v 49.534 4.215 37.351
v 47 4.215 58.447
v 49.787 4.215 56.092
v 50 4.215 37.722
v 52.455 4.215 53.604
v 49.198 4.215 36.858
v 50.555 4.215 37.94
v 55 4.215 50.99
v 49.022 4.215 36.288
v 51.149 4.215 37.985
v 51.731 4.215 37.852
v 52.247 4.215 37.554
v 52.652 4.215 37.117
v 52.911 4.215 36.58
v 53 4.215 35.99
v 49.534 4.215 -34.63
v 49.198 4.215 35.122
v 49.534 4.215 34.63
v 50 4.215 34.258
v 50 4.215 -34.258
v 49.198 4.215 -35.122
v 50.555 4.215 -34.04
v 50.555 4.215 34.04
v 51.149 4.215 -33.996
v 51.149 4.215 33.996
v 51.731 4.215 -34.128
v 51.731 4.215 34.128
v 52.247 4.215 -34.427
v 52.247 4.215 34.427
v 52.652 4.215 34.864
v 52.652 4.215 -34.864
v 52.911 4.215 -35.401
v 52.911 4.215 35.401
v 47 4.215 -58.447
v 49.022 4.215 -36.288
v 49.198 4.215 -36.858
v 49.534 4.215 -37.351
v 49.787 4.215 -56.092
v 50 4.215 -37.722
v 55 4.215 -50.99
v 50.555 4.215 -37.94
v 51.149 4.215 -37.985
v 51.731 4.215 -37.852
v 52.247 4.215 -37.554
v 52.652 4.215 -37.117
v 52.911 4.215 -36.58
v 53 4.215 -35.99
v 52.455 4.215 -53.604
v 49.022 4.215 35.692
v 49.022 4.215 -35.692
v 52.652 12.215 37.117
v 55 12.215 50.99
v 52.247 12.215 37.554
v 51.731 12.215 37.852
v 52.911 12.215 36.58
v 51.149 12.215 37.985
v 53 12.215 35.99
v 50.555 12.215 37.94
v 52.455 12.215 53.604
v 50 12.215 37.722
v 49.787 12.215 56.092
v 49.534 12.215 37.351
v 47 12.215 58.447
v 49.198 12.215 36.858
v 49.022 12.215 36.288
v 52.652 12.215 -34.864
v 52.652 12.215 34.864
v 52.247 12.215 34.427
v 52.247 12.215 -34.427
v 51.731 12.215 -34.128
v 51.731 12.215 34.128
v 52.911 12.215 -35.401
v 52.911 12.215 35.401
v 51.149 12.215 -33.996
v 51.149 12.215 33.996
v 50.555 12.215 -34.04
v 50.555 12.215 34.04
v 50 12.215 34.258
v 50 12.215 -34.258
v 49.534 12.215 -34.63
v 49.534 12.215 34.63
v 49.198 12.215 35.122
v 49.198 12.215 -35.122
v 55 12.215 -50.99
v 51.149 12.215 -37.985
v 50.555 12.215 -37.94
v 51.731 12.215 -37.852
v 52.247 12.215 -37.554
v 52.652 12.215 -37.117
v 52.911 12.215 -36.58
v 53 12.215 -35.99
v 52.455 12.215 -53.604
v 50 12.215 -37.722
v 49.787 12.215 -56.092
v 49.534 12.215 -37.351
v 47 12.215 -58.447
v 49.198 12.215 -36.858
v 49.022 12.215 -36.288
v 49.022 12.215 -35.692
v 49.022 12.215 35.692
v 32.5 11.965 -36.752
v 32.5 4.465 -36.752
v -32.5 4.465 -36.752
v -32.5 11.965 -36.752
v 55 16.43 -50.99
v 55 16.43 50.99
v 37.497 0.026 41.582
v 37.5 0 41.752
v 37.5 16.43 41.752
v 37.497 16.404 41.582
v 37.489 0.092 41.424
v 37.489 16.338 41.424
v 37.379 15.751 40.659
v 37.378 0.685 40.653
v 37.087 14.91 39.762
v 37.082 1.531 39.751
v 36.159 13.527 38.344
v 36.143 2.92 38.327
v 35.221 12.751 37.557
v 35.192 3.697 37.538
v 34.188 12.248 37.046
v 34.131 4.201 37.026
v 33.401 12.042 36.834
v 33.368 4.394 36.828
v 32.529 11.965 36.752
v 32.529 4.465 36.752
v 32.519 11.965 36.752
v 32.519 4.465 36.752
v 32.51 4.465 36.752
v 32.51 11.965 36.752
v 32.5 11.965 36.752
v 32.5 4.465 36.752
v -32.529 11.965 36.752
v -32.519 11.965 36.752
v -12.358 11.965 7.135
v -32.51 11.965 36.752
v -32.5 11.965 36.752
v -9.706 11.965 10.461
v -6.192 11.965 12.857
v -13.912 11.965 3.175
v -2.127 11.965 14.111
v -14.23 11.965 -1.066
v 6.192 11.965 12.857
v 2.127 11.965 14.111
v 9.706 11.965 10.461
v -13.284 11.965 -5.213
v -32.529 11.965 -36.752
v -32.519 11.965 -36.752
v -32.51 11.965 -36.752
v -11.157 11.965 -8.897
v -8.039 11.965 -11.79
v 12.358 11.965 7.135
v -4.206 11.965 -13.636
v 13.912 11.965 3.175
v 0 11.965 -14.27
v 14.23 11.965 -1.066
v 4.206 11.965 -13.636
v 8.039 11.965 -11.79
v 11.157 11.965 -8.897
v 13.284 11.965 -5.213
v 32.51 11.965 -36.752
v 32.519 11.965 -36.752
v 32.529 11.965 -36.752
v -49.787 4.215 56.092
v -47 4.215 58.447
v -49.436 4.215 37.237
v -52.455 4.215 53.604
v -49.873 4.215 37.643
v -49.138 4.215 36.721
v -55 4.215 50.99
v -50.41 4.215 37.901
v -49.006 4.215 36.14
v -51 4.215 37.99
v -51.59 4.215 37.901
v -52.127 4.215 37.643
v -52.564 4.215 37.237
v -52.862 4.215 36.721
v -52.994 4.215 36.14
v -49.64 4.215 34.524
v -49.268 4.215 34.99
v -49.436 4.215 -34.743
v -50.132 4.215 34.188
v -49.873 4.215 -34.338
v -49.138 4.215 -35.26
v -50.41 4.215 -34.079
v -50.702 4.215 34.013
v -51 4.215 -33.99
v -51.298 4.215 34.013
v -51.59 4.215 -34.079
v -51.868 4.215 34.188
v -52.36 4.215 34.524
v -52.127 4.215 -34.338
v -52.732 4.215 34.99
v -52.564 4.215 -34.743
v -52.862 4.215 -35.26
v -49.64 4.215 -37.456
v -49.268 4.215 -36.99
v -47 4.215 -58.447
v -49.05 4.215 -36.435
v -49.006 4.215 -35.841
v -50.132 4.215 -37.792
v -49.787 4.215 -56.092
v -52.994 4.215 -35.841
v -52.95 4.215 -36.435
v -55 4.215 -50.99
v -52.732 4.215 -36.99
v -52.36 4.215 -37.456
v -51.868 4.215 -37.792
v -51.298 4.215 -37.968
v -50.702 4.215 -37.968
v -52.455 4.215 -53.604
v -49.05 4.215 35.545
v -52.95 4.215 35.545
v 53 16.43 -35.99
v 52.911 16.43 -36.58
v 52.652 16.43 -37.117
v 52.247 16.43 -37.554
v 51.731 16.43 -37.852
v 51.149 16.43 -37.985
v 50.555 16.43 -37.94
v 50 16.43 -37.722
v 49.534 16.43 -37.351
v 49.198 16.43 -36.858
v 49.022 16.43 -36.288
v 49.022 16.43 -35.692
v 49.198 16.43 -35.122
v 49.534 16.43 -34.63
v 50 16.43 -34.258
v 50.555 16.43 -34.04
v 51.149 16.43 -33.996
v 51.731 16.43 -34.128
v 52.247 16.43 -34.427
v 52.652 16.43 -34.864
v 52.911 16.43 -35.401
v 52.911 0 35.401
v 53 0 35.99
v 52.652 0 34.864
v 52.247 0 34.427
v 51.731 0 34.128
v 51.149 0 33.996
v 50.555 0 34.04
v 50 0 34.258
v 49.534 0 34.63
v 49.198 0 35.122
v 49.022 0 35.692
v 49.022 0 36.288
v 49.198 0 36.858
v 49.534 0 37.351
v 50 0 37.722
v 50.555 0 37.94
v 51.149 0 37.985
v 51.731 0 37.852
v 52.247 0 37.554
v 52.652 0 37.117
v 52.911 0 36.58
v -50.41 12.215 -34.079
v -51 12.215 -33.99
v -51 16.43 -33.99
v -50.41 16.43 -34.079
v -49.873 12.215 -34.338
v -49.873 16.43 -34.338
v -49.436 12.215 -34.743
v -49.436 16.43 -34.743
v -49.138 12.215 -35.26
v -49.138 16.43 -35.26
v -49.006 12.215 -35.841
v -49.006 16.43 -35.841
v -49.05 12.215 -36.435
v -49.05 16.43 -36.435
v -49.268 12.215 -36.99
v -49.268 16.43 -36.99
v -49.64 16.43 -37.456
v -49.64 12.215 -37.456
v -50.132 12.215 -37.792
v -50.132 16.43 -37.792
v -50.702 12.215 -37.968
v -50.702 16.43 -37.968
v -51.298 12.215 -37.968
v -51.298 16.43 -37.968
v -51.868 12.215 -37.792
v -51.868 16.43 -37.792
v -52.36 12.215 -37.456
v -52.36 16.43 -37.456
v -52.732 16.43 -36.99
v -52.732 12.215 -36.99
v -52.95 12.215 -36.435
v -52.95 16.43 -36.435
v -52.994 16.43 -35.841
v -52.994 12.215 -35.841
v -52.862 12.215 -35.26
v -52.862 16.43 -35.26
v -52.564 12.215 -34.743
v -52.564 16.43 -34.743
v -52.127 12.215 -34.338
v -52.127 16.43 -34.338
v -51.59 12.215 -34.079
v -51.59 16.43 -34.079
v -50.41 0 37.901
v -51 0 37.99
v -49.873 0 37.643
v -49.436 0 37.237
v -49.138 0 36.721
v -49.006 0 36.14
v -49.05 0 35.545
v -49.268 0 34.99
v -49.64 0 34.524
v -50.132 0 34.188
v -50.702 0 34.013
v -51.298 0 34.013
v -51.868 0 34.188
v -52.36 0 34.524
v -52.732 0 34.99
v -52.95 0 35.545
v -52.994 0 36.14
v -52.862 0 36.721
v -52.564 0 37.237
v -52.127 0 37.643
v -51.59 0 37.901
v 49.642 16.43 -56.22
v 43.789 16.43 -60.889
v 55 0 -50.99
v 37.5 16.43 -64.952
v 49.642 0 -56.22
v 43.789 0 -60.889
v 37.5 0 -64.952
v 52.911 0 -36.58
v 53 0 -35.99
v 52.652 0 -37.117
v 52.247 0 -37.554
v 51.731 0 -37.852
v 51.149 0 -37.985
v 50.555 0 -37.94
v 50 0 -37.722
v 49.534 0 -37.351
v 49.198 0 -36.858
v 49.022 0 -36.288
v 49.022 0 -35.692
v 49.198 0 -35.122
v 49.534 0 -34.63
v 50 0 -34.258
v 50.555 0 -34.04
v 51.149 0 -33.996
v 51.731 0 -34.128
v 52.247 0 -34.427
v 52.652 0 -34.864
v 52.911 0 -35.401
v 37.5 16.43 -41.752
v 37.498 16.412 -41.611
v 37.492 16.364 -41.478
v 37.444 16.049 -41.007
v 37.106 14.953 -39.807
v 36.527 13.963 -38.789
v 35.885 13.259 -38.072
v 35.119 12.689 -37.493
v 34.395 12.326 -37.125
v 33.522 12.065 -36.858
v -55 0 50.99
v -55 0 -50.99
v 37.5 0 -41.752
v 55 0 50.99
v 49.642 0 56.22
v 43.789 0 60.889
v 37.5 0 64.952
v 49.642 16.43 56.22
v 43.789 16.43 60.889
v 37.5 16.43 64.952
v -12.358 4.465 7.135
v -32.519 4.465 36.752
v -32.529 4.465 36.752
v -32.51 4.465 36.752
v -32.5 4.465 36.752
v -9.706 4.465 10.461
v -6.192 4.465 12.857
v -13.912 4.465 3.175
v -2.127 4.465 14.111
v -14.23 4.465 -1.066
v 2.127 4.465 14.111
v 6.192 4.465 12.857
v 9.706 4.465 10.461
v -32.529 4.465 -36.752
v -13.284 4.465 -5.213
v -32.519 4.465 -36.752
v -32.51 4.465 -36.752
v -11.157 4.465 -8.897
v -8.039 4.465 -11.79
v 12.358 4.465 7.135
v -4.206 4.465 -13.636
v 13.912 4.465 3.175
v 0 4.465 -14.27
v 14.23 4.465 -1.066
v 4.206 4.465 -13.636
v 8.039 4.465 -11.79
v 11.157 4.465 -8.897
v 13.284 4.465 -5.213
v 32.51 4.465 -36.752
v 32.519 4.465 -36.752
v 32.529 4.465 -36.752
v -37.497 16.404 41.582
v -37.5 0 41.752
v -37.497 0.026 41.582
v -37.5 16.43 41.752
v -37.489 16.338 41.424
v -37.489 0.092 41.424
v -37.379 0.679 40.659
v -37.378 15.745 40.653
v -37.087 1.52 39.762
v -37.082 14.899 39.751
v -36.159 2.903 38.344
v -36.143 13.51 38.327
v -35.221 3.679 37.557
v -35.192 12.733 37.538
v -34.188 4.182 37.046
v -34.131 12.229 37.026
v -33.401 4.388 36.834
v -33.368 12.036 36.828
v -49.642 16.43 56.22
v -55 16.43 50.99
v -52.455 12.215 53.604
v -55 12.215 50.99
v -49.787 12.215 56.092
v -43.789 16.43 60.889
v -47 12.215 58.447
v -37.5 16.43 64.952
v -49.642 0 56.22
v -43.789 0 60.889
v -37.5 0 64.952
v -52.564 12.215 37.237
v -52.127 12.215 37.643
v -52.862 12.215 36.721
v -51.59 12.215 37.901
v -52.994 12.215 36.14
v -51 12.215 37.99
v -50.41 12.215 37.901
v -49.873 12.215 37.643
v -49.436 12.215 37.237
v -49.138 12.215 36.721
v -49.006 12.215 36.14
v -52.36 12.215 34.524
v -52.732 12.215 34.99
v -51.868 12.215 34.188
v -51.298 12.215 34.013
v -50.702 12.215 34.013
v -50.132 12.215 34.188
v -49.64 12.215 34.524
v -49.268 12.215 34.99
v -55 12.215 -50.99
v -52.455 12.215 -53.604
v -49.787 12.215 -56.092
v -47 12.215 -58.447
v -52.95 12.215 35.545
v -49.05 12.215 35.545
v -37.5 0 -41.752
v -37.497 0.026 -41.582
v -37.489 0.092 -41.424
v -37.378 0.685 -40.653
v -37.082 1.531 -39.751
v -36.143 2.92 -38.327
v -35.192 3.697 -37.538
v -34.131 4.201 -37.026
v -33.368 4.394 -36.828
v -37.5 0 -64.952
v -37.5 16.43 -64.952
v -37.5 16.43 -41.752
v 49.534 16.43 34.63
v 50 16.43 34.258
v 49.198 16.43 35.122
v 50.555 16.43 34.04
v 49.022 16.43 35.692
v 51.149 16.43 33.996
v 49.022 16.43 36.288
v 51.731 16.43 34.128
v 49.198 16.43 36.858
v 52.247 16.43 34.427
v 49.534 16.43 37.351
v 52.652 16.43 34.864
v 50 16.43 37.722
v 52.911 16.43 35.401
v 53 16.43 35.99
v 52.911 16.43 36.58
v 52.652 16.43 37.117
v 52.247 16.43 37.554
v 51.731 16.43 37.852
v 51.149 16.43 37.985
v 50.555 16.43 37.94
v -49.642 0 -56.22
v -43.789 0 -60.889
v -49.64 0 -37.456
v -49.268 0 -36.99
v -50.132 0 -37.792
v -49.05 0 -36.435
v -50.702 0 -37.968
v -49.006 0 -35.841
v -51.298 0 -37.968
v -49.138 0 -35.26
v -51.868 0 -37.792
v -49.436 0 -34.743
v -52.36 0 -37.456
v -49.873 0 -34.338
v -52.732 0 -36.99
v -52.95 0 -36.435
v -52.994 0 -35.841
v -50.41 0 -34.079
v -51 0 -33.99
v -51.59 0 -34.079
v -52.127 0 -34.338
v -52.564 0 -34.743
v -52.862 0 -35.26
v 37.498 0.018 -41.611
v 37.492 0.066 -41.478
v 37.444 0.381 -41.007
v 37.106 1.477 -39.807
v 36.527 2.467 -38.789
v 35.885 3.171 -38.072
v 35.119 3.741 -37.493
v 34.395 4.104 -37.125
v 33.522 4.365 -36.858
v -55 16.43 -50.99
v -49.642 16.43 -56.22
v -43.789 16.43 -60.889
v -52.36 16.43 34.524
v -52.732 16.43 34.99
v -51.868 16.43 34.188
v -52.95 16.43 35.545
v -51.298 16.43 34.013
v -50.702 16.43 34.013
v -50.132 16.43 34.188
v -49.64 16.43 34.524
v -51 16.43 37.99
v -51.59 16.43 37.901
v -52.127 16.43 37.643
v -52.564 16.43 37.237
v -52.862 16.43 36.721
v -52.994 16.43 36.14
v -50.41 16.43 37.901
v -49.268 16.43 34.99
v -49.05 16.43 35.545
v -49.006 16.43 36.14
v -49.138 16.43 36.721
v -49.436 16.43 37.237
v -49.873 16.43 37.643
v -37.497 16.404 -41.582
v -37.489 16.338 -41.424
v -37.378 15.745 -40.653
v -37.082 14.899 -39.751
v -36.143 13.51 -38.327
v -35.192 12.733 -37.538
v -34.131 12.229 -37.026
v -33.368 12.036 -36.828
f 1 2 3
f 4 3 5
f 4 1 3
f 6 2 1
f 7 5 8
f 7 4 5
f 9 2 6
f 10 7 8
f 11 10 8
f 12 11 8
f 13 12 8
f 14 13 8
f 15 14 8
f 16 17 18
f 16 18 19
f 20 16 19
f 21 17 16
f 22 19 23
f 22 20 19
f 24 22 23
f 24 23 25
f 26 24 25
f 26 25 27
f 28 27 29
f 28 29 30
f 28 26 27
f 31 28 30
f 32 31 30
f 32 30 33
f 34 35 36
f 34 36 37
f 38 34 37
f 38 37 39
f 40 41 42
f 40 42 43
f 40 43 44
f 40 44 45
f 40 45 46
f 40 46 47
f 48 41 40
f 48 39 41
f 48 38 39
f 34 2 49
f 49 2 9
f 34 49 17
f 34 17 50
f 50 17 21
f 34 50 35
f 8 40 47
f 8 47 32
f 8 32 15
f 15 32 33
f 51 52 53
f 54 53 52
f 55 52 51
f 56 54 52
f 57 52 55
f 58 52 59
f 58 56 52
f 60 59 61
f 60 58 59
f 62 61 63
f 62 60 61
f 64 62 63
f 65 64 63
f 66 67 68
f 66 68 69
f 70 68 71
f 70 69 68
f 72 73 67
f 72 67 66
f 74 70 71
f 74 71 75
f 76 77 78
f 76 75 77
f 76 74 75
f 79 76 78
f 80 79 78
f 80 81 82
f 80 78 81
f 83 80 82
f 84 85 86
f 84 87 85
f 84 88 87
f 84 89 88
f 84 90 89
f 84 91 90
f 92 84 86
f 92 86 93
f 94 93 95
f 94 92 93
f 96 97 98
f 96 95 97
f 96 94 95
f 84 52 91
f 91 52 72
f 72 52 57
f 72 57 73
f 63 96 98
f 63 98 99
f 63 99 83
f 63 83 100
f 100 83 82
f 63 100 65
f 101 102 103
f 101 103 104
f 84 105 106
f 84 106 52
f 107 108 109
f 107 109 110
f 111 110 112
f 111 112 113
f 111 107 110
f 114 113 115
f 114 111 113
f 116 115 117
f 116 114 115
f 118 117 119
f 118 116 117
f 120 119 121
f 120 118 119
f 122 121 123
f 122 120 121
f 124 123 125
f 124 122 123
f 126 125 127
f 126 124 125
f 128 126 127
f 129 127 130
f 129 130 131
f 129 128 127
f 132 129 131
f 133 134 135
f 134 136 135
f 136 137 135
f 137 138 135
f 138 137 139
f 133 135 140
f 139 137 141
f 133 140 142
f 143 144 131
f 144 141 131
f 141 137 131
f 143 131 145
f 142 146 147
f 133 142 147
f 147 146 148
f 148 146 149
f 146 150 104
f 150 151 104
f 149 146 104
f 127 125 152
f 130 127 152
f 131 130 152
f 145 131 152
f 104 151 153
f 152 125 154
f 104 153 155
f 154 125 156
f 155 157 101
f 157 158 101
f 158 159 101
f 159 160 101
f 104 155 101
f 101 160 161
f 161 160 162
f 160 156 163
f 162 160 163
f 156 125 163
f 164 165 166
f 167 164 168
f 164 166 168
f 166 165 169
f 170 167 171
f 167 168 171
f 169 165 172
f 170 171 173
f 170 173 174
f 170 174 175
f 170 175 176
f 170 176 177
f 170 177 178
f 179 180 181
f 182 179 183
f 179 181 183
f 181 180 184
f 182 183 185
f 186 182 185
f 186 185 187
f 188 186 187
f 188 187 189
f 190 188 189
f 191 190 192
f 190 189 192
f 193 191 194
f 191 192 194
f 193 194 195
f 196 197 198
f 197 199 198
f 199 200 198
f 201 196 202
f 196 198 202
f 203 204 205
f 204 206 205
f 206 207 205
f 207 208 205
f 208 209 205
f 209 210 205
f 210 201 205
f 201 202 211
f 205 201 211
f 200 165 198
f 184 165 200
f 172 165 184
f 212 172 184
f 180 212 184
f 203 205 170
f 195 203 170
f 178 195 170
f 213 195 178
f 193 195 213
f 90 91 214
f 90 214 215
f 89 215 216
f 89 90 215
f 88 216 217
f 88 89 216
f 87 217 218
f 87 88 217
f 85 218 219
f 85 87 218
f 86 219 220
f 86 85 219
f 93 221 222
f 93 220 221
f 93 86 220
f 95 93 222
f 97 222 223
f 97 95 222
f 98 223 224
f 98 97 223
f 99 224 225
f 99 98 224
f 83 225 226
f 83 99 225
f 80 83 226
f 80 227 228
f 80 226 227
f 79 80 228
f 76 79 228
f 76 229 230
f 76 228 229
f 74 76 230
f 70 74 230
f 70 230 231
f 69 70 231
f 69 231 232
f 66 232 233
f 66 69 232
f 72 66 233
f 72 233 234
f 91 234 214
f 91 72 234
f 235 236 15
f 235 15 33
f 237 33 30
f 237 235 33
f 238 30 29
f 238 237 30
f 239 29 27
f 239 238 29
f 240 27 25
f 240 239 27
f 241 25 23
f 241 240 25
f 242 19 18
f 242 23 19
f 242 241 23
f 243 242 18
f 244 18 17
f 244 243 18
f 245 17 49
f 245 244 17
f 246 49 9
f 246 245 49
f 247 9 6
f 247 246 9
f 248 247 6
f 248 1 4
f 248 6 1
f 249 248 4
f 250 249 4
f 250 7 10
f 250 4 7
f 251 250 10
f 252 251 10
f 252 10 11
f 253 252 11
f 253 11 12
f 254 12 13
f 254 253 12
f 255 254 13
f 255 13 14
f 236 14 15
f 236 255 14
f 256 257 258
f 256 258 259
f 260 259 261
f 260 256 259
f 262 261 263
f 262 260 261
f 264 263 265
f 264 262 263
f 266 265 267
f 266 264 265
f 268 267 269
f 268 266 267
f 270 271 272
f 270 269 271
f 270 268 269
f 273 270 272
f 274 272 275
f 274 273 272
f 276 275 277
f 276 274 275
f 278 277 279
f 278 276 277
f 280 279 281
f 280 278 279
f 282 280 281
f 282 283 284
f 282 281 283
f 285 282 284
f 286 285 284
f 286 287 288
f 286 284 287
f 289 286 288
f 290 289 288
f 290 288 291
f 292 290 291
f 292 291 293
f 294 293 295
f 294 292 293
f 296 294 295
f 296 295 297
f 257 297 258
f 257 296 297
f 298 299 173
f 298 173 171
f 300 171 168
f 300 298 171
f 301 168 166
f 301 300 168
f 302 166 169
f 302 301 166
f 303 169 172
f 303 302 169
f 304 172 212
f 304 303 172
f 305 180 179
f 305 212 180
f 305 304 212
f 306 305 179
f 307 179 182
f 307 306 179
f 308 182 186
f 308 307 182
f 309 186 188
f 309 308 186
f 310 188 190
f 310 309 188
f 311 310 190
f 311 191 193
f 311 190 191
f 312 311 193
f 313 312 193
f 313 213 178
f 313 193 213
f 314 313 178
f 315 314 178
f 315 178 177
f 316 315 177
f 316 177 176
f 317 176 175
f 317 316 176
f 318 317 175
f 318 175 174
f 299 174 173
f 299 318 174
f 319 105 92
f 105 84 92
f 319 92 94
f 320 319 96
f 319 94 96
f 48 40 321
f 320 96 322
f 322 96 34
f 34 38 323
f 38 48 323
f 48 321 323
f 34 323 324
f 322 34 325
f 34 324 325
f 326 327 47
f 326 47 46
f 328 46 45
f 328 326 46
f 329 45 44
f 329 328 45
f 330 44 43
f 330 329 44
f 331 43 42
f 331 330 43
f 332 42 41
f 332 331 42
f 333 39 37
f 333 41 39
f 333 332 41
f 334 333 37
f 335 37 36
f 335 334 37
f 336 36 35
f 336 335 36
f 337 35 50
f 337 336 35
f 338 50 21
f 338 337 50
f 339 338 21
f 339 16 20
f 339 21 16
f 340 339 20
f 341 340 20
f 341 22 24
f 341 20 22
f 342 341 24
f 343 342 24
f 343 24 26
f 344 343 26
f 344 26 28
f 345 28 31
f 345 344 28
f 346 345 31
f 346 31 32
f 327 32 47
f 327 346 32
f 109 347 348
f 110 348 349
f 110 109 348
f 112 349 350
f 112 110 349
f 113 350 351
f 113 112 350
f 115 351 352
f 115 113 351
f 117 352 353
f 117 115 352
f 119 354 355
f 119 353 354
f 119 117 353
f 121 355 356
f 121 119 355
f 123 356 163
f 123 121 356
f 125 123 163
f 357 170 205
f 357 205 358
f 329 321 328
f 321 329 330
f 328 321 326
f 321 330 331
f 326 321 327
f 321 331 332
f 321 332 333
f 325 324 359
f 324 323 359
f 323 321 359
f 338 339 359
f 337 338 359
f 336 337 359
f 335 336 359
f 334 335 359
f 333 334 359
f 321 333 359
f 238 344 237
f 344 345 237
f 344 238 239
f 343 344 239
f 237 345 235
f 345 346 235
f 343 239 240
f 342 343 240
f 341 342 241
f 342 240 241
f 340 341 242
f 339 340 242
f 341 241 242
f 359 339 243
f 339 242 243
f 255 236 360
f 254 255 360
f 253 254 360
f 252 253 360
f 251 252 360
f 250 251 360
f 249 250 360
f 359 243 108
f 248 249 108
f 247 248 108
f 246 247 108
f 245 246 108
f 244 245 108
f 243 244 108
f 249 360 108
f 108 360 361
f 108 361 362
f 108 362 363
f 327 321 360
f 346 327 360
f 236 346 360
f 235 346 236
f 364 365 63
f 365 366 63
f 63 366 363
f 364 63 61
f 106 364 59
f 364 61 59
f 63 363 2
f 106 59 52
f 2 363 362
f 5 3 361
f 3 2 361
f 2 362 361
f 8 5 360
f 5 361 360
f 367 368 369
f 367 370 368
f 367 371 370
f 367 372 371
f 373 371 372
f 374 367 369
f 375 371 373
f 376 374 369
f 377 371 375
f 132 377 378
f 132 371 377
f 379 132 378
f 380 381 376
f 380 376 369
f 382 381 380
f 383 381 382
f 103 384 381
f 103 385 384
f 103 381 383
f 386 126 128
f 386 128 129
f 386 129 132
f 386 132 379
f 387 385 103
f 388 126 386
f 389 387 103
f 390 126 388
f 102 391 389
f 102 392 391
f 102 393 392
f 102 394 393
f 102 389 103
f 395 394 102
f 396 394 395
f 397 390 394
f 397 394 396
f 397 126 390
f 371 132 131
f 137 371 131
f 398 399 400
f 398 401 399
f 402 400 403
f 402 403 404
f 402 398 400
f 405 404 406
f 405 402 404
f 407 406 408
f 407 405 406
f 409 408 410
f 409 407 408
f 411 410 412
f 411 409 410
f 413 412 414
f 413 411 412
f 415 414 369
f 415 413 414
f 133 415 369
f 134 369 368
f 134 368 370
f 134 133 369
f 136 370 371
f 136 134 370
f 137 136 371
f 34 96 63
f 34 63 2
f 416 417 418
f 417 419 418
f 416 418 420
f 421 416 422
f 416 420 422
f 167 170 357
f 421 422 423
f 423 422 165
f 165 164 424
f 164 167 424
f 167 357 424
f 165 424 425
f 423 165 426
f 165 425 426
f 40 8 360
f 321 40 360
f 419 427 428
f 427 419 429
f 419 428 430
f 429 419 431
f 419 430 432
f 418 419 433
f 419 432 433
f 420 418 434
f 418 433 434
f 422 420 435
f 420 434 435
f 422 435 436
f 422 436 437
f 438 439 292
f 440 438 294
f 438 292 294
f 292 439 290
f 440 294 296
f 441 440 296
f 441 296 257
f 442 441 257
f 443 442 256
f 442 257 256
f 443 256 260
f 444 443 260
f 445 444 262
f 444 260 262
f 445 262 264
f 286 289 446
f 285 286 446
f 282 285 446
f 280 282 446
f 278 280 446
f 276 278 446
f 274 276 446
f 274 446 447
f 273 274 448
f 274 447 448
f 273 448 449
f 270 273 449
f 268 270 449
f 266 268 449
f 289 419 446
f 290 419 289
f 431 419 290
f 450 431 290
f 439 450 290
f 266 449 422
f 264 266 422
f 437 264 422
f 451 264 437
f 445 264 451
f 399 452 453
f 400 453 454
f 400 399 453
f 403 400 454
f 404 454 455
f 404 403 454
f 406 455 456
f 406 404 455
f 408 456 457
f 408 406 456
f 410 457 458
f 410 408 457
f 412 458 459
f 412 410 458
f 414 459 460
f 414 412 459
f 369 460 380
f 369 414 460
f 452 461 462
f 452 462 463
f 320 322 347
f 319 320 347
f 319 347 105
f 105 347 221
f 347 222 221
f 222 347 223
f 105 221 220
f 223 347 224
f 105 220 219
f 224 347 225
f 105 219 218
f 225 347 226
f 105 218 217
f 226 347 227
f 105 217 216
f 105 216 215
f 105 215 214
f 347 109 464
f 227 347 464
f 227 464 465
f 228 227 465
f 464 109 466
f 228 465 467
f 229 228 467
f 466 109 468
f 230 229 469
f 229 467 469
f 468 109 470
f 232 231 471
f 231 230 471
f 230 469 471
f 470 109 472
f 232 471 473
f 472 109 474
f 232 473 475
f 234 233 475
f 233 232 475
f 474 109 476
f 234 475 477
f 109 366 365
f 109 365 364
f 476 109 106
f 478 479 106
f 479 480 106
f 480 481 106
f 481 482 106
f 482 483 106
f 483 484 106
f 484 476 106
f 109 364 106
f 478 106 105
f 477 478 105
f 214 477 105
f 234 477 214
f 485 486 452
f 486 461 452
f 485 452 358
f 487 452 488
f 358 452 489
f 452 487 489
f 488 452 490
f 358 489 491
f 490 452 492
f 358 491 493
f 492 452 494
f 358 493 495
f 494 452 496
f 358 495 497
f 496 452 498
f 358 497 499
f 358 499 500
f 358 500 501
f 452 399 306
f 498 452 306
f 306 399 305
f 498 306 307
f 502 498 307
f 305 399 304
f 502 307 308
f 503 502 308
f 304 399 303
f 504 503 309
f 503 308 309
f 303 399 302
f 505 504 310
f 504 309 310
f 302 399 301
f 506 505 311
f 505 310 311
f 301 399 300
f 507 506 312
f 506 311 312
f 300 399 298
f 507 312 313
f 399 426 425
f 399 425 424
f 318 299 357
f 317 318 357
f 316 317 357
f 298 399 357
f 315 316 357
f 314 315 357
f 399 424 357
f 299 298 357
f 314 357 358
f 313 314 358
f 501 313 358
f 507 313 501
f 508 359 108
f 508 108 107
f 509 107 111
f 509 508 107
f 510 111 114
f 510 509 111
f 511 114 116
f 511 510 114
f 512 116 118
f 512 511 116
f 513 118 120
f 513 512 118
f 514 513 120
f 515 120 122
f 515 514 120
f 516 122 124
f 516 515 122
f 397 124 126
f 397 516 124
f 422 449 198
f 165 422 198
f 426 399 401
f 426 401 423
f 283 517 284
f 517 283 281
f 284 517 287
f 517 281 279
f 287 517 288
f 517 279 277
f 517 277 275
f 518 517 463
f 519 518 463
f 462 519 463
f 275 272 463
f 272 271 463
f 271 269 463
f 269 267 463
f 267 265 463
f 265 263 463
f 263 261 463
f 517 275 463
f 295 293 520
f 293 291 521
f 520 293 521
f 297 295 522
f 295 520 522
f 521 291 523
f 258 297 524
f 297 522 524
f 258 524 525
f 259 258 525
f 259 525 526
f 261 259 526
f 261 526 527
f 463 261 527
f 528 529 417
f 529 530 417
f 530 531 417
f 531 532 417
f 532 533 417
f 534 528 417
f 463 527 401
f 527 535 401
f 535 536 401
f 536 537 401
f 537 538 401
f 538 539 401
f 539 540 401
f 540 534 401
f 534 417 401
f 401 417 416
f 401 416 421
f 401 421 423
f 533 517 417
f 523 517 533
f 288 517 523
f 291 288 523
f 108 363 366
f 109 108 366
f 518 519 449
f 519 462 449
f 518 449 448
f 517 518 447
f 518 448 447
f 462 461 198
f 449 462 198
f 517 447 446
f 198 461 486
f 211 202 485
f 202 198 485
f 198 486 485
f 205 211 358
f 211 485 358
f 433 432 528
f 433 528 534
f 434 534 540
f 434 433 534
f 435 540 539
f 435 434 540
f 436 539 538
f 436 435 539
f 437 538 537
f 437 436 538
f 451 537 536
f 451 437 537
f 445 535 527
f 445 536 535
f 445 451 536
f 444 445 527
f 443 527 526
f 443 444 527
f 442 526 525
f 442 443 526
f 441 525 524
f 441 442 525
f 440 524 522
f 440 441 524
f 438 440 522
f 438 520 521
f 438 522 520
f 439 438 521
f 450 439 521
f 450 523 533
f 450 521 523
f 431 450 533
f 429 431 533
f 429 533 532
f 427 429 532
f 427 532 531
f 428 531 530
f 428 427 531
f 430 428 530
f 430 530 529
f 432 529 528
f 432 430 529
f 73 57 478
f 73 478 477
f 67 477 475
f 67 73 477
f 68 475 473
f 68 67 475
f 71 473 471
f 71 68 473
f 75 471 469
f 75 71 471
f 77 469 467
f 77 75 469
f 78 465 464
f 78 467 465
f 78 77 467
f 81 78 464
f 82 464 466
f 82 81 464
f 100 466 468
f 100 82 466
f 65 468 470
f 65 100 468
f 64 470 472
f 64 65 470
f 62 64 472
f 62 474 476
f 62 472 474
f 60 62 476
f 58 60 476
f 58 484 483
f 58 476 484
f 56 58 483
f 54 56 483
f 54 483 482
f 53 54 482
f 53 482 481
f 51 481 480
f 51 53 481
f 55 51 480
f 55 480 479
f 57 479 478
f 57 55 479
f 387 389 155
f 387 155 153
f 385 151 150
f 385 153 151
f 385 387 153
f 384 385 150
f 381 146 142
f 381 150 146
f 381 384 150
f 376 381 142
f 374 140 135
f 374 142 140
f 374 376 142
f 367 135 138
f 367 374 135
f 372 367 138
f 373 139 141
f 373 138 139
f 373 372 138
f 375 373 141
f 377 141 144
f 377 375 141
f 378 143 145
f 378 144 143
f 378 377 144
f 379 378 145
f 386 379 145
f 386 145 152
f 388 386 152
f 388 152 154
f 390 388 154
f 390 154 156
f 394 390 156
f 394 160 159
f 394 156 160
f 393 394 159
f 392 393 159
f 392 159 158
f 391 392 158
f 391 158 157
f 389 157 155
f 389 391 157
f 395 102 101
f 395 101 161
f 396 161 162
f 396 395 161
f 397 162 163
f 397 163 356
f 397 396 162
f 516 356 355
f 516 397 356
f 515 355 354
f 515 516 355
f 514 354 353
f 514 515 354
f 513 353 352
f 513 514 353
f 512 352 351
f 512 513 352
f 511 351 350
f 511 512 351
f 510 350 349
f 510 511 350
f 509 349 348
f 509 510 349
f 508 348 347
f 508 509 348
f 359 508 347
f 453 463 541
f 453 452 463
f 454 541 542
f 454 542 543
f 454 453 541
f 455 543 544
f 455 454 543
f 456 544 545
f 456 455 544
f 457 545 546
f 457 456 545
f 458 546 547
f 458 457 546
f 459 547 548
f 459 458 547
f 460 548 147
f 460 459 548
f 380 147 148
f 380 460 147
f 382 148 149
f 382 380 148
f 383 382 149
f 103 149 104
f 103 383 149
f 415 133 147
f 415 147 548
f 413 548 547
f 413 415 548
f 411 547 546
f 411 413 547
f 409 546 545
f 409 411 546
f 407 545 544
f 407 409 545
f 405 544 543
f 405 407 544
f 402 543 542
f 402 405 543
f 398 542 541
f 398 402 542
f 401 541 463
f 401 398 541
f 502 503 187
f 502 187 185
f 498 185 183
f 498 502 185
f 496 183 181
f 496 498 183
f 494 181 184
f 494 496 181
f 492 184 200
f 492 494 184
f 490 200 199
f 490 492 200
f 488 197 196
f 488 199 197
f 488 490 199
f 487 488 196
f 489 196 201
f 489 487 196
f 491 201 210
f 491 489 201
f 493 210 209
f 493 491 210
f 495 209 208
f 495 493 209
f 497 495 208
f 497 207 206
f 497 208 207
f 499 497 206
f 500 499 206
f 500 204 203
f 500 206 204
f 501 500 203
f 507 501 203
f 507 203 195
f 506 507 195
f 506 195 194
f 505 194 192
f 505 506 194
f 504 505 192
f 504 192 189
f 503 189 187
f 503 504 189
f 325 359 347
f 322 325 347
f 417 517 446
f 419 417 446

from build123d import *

# Parameters (mm, degrees)
SALIENTE_EXTRUIR1_DEPTH    = 100
CORTAR_EXTRUIR1_DEPTH      = 116.30370722574361
CORTAR_EXTRUIR1_DEPTH_BACK = 116.30370722574361
CROQUIS4_OUTSIDE_W         = 157.768
CROQUIS4_OUTSIDE_H         = 247.76800000000003
CROQUIS4_OUTSIDE_R         = 75.00000000000001
CORTAR_EXTRUIR2_DEPTH      = 95.44545992264534
CORTAR_EXTRUIR2_DEPTH_BACK = 95.44545992264534
CORTAR_EXTRUIR3_DEPTH      = 86.94714204090798
CORTAR_EXTRUIR3_DEPTH_BACK = 86.94714204090798
CROQUIS5_R                 = 14.27
REDONDEO1_R                = 5
CORTAR_EXTRUIR4_DEPTH      = 87.68157187826033
CORTAR_EXTRUIR4_DEPTH_BACK = 87.68157187826033
CORTAR_EXTRUIR5_DEPTH      = 86.98230182684696
CORTAR_EXTRUIR5_DEPTH_BACK = 86.98230182684696
CROQUIS8_R                 = 2.0000000000000036


with BuildPart() as part:
    # Croquis3 → Saliente-Extruir1 (new, symmetric)
    with BuildSketch(Plane.XY):
        Polygon((37.50000000000001, 4.465), (0, 4.465), (-37.50000000000001, 4.465), (-37.5, 0), (-54.99999999999999, 0), (-54.99999999999999, 6.5), (-54.99999999999999, 16.43), (-37.5, 16.43), (-37.50000000000001, 11.965), (0, 11.965), (37.50000000000001, 11.965), (37.5, 16.43), (54.99999999999999, 16.43), (54.99999999999999, 0), (37.5, 0), align=None)
    extrude(amount=SALIENTE_EXTRUIR1_DEPTH, both=True)

    # Croquis4 outside → Cortar-Extruir1 (cut, two sides: drawn at the far end of the back side and taken through both)
    with BuildSketch(Plane(origin=(0, 0, 0), x_dir=(1, 0, 0), z_dir=(0, 1, 0)).offset(-CORTAR_EXTRUIR1_DEPTH_BACK)):
        Rectangle(CROQUIS4_OUTSIDE_W, CROQUIS4_OUTSIDE_H)
        Circle(CROQUIS4_OUTSIDE_R, mode=Mode.SUBTRACT)
    extrude(amount=CORTAR_EXTRUIR1_DEPTH + CORTAR_EXTRUIR1_DEPTH_BACK, mode=Mode.SUBTRACT)

    # Croquis4<3> → Cortar-Extruir2 (cut, two sides: drawn at the far end of the back side and taken through both)
    with BuildSketch(Plane(origin=(0, 0, 0), x_dir=(1, 0, 0), z_dir=(0, 1, 0)).offset(-CORTAR_EXTRUIR2_DEPTH_BACK)):
        with BuildLine():
            ThreePointArc((37.500000000000966, 64.95190528383236), (1.17033e-12, 75.00000000000001), (-37.499999999998956, 64.95190528383351))
            Line((-37.50000000000001, 64.95190528383388), (-37.50000000000001, 36.752103032136134))
            Line((-37.50000000000001, 36.752103032136134), (37.50000000000001, 36.752103032136134))
            Line((37.50000000000001, 36.752103032136134), (37.50000000000001, 64.95190528383202))
        make_face()
        with BuildLine():
            Line((-37.50000000000001, -36.752103032136134), (-37.50000000000001, -64.95190528383385))
            ThreePointArc((-37.499999999999, -64.95190528383348), (1.18526e-12, -75.00000000000001), (37.50000000000099, -64.95190528383235))
            Line((37.50000000000001, -64.951905283832), (37.50000000000001, -36.752103032136134))
            Line((37.50000000000001, -36.752103032136134), (-37.50000000000001, -36.752103032136134))
        make_face()
    extrude(amount=CORTAR_EXTRUIR2_DEPTH + CORTAR_EXTRUIR2_DEPTH_BACK, mode=Mode.SUBTRACT)

    # Croquis5 → Cortar-Extruir3 (cut, two sides: drawn at the far end of the back side and taken through both)
    with BuildSketch(Plane(origin=(0, 11.965, 0), x_dir=(1, 0, 0), z_dir=(0, 1, 0)).offset(-CORTAR_EXTRUIR3_DEPTH_BACK)):
        with Locations(Location((0, 0, 0), (0, 0, 90))):
            Circle(CROQUIS5_R)
    extrude(amount=CORTAR_EXTRUIR3_DEPTH + CORTAR_EXTRUIR3_DEPTH_BACK, mode=Mode.SUBTRACT)

    # Redondeo1
    # the kernel refuses this fillet: 5 mm, written as the material it adds along each edge
    with BuildSketch(Plane(origin=(-37.50000000000001, 4.465, 36.752103032136134), x_dir=(1, 0, 0), z_dir=(0, 0, -1))) as redondeo1_piece_1:
        with BuildLine():
            CenterArc((4.971295102888192, 5), REDONDEO1_R, 186.14240739101976, 83.85759260898021)
            Line((1.421e-14, 4.465000000000001), (-0.09942590205774593, 4.454300000000001))
            ThreePointArc((-0.09942590205774593, 4.454300000000001), (-0.09999999999999432, 2.2325000000000004), (-0.10000000000000142, 0))
            Line((-0.10000000000000142, 0), (0, -0.09999999999999964))
            Line((0, -0.09999999999999964), (4.971295102888192, -0.09999999999999964))
            Line((4.971295102888192, -0.09999999999999964), (4.971295102888192, 0))
        make_face()
    extrude(amount=73.50420606427225)
    with BuildSketch(Plane(origin=(-37.50000000000001, 11.965, 36.752103032136134), x_dir=(1, 0, 0), z_dir=(0, 0, -1))) as redondeo1_piece_2:
        with BuildLine():
            CenterArc((4.971295102888185, -5), REDONDEO1_R, 90, 83.85759260898024)
            Line((7.11e-15, -4.465), (-0.09942590205775304, -4.4543))
            ThreePointArc((-0.09942590205775304, -4.4543), (-0.10000000000001563, -2.2325000000000017), (-0.10000000000000142, 0))
            Line((-0.10000000000000142, 0), (0, 0.09999999999999964))
            Line((0, 0.09999999999999964), (4.971295102888185, 0.09999999999999964))
            Line((4.971295102888185, 0.09999999999999964), (4.971295102888185, 0))
        make_face()
    extrude(amount=73.50420606427225)
    with BuildSketch(Plane(origin=(37.50000000000001, 11.965, 36.752103032136134), x_dir=(-3.18e-15, 1, 0), z_dir=(0, 0, -1))) as redondeo1_piece_3:
        with BuildLine():
            CenterArc((5.000000000000016, -4.971295102888176), REDONDEO1_R, 96.14240739101996, 83.85759260898021)
            Line((1.582e-14, -4.971295102888192), (-0.09999999999998382, -4.971295102888192))
            Line((-0.09999999999998382, -4.971295102888192), (-0.09999999999999964, -3.2e-16))
            Line((-0.09999999999999964, -3.2e-16), (-3.2e-16, 0.10000000000000142))
            ThreePointArc((-3.2e-16, 0.10000000000000142), (2.2324999999999995, 0.10000000000002274), (4.4543, 0.09942590205776011))
            Line((4.4543, 0.09942590205776011), (4.465, 0))
        make_face()
    extrude(amount=73.50420606427225)
    with BuildSketch(Plane(origin=(37.50000000000001, 4.465, -36.752103032136134), x_dir=(-1.59e-15, -1, 0), z_dir=(0, 0, 1))) as redondeo1_piece_4:
        with BuildLine():
            CenterArc((5.000000000000008, -4.971295102888177), REDONDEO1_R, 96.14240739101987, 83.85759260898021)
            Line((7.91e-15, -4.971295102888185), (-0.09999999999999173, -4.971295102888185))
            Line((-0.09999999999999173, -4.971295102888185), (-0.09999999999999964, -1.6e-16))
            Line((-0.09999999999999964, -1.6e-16), (-1.6e-16, 0.10000000000000142))
            ThreePointArc((-1.6e-16, 0.10000000000000142), (2.2325, 0.09999999999999787), (4.4543, 0.09942590205776013))
            Line((4.4543, 0.09942590205776013), (4.465, 0))
        make_face()
    extrude(amount=73.50420606427225)
    with BuildSketch(Plane(origin=(37.50000000000001, 4.465000000000003, -36.752103032136134), x_dir=(0, 0, -1), z_dir=(0, 1, 0)), Plane(origin=(-37.50000000000001, 4.465000000000003, -36.752103032136134), x_dir=(1, 0, 0), z_dir=(0, 1, 0)), Plane(origin=(-37.50000000000001, 11.965000000000003, 36.752103032136134), x_dir=(1, 0, 0), z_dir=(0, -1, 0))) as redondeo1_piece_5:
        with BuildLine():
            CenterArc((REDONDEO1_R, REDONDEO1_R), REDONDEO1_R, 180, 90)
            Line((0, REDONDEO1_R), (-REDONDEO1_R * 0.02, REDONDEO1_R))
            Line((-REDONDEO1_R * 0.02, REDONDEO1_R), (-REDONDEO1_R * 0.02, -REDONDEO1_R * 0.02))
            Line((-REDONDEO1_R * 0.02, -REDONDEO1_R * 0.02), (REDONDEO1_R, -REDONDEO1_R * 0.02))
            Line((REDONDEO1_R, -REDONDEO1_R * 0.02), (REDONDEO1_R, 0))
        make_face()
    extrude(amount=7.5)
    with BuildSketch(Plane(origin=(37.50000000000001, 4.465000000000003, 36.752103032136134), x_dir=(0, 0, 1), z_dir=(0, 1, 0))) as redondeo1_piece_6:
        with BuildLine():
            CenterArc((REDONDEO1_R, -REDONDEO1_R), REDONDEO1_R, 90, 90)
            Line((0, -REDONDEO1_R), (-REDONDEO1_R * 0.02, -REDONDEO1_R))
            Line((-REDONDEO1_R * 0.02, -REDONDEO1_R), (-REDONDEO1_R * 0.02, REDONDEO1_R * 0.02))
            Line((-REDONDEO1_R * 0.02, REDONDEO1_R * 0.02), (REDONDEO1_R, REDONDEO1_R * 0.02))
            Line((REDONDEO1_R, REDONDEO1_R * 0.02), (REDONDEO1_R, 0))
        make_face()
    extrude(amount=7.5)
    with BuildSketch(Plane(origin=(-37.50000000000001, 4.465, 49.18034078935661), x_dir=(1, 0, 0), z_dir=(0, 0, -1))) as redondeo1_piece_7a_section:
        with BuildLine():
            CenterArc((4.971295102888192, 5), REDONDEO1_R, 186.14240739101976, 83.85759260898021)
            Line((1.421e-14, 4.465000000000001), (-0.09942590205774593, 4.454300000000001))
            ThreePointArc((-0.09942590205774593, 4.454300000000001), (-0.09999999999999432, 2.2325000000000004), (-0.10000000000000142, 0))
            Line((-0.10000000000000142, 0), (0, -0.09999999999999964))
            Line((0, -0.09999999999999964), (4.971295102888192, -0.09999999999999964))
            Line((4.971295102888192, -0.09999999999999964), (4.971295102888192, 0))
        make_face()
    redondeo1_piece_7a = extrude(amount=85.93244382149274, mode=Mode.PRIVATE)
    redondeo1_piece_7a = split(redondeo1_piece_7a, bisect_by=Plane(origin=(-36.3586151753133, 3.3888910870281705, 36.752103032136134), z_dir=(0, 0, 1)), keep=Keep.TOP, mode=Mode.PRIVATE)
    with BuildSketch(Plane(origin=(-37.50000000000001, 11.965000000000003, 36.752103032136134), x_dir=(1, 0, 0), z_dir=(0, -1, 0))) as redondeo1_piece_7b_section:
        with BuildLine():
            CenterArc((REDONDEO1_R, REDONDEO1_R), REDONDEO1_R, 180, 90)
            Line((0, REDONDEO1_R), (-REDONDEO1_R * 0.02, REDONDEO1_R))
            Line((-REDONDEO1_R * 0.02, REDONDEO1_R), (-REDONDEO1_R * 0.02, -REDONDEO1_R * 0.02))
            Line((-REDONDEO1_R * 0.02, -REDONDEO1_R * 0.02), (REDONDEO1_R, -REDONDEO1_R * 0.02))
            Line((REDONDEO1_R, -REDONDEO1_R * 0.02), (REDONDEO1_R, 0))
        make_face()
    redondeo1_piece_7b = extrude(amount=20, mode=Mode.PRIVATE)
    redondeo1_piece_7b = split(redondeo1_piece_7b, bisect_by=Plane(origin=(-36.3680244286659, 4.465, 37.884078603470265), z_dir=(0, -1, 0)), keep=Keep.TOP, mode=Mode.PRIVATE)
    redondeo1_piece_7b = split(redondeo1_piece_7b, bisect_by=Plane(origin=(-36.368024428665905, 0, 37.884078603470265), z_dir=(0, 1, 0)), keep=Keep.TOP, mode=Mode.PRIVATE)
    redondeo1_piece_7 = redondeo1_piece_7a & redondeo1_piece_7b
    add(redondeo1_piece_7)
    with BuildSketch(Plane(origin=(-37.50000000000001, 4.465, 36.752103032136134), x_dir=(1, 0, 0), z_dir=(0, 0, -1))) as redondeo1_piece_8a_section:
        with BuildLine():
            CenterArc((4.971295102888192, 5), REDONDEO1_R, 186.14240739101976, 83.85759260898021)
            Line((1.421e-14, 4.465000000000001), (-0.09942590205774593, 4.454300000000001))
            ThreePointArc((-0.09942590205774593, 4.454300000000001), (-0.09999999999999432, 2.2325000000000004), (-0.10000000000000142, 0))
            Line((-0.10000000000000142, 0), (0, -0.09999999999999964))
            Line((0, -0.09999999999999964), (4.971295102888192, -0.09999999999999964))
            Line((4.971295102888192, -0.09999999999999964), (4.971295102888192, 0))
        make_face()
    redondeo1_piece_8a = extrude(amount=85.93244382149273, mode=Mode.PRIVATE)
    redondeo1_piece_8a = split(redondeo1_piece_8a, bisect_by=Plane(origin=(-36.35861517531315, 3.3888910870273232, -36.752103032136134), z_dir=(0, 0, -1)), keep=Keep.TOP, mode=Mode.PRIVATE)
    with BuildSketch(Plane(origin=(-37.499999999999986, -8.034999999999997, -36.752103032136134), x_dir=(1, 0, 0), z_dir=(0, 1, 0))) as redondeo1_piece_8b_section:
        with BuildLine():
            CenterArc((REDONDEO1_R, REDONDEO1_R), REDONDEO1_R, 180, 90)
            Line((0, REDONDEO1_R), (-REDONDEO1_R * 0.02, REDONDEO1_R))
            Line((-REDONDEO1_R * 0.02, REDONDEO1_R), (-REDONDEO1_R * 0.02, -REDONDEO1_R * 0.02))
            Line((-REDONDEO1_R * 0.02, -REDONDEO1_R * 0.02), (REDONDEO1_R, -REDONDEO1_R * 0.02))
            Line((REDONDEO1_R, -REDONDEO1_R * 0.02), (REDONDEO1_R, 0))
        make_face()
    redondeo1_piece_8b = extrude(amount=20, mode=Mode.PRIVATE)
    redondeo1_piece_8b = split(redondeo1_piece_8b, bisect_by=Plane(origin=(-36.36802442866587, 4.465, -37.884078603470265), z_dir=(0, -1, 0)), keep=Keep.TOP, mode=Mode.PRIVATE)
    redondeo1_piece_8b = split(redondeo1_piece_8b, bisect_by=Plane(origin=(-36.36802442866587, 0, -37.884078603470265), z_dir=(0, 1, 0)), keep=Keep.TOP, mode=Mode.PRIVATE)
    redondeo1_piece_8 = redondeo1_piece_8a & redondeo1_piece_8b
    add(redondeo1_piece_8)
    with BuildSketch(Plane(origin=(-37.500000000000036, 24.465000000000003, 36.752103032136134), x_dir=(1, 0, 0), z_dir=(0, -1, 0))) as redondeo1_piece_9a_section:
        with BuildLine():
            CenterArc((REDONDEO1_R, REDONDEO1_R), REDONDEO1_R, 180, 90)
            Line((0, REDONDEO1_R), (-REDONDEO1_R * 0.02, REDONDEO1_R))
            Line((-REDONDEO1_R * 0.02, REDONDEO1_R), (-REDONDEO1_R * 0.02, -REDONDEO1_R * 0.02))
            Line((-REDONDEO1_R * 0.02, -REDONDEO1_R * 0.02), (REDONDEO1_R, -REDONDEO1_R * 0.02))
            Line((REDONDEO1_R, -REDONDEO1_R * 0.02), (REDONDEO1_R, 0))
        make_face()
    redondeo1_piece_9a = extrude(amount=20, mode=Mode.PRIVATE)
    redondeo1_piece_9a = split(redondeo1_piece_9a, bisect_by=Plane(origin=(-36.36802442866591, 11.965, 37.884078603470265), z_dir=(0, 1, 0)), keep=Keep.TOP, mode=Mode.PRIVATE)
    redondeo1_piece_9a = split(redondeo1_piece_9a, bisect_by=Plane(origin=(-36.36802442866591, 16.43, 37.884078603470265), z_dir=(0, -1, 0)), keep=Keep.TOP, mode=Mode.PRIVATE)
    with BuildSketch(Plane(origin=(-37.50000000000002, 11.965, 49.18034078935659), x_dir=(1, 0, 0), z_dir=(0, 0, -1))) as redondeo1_piece_9b_section:
        with BuildLine():
            CenterArc((4.971295102888199, -5), REDONDEO1_R, 90, 83.85759260898024)
            Line((2.132e-14, -4.465), (-0.09942590205773882, -4.4543))
            ThreePointArc((-0.09942590205773882, -4.4543), (-0.10000000000000142, -2.2325000000000017), (-0.10000000000000142, 0))
            Line((-0.10000000000000142, 0), (0, 0.09999999999999964))
            Line((0, 0.09999999999999964), (4.971295102888199, 0.09999999999999964))
            Line((4.971295102888199, 0.09999999999999964), (4.971295102888199, 0))
        make_face()
    redondeo1_piece_9b = extrude(amount=85.93244382149271, mode=Mode.PRIVATE)
    redondeo1_piece_9b = split(redondeo1_piece_9b, bisect_by=Plane(origin=(-36.35861517531264, 13.04110891296965, 36.752103032136134), z_dir=(0, 0, 1)), keep=Keep.TOP, mode=Mode.PRIVATE)
    redondeo1_piece_9 = redondeo1_piece_9a & redondeo1_piece_9b
    add(redondeo1_piece_9)
    with BuildSketch(Plane(origin=(-37.50000000000001, 11.965, 36.752103032136134), x_dir=(1, 0, 0), z_dir=(0, 0, -1))) as redondeo1_piece_10a_section:
        with BuildLine():
            CenterArc((4.971295102888185, -5), REDONDEO1_R, 90, 83.85759260898024)
            Line((7.11e-15, -4.465), (-0.09942590205775304, -4.4543))
            ThreePointArc((-0.09942590205775304, -4.4543), (-0.10000000000001563, -2.2325000000000017), (-0.10000000000000142, 0))
            Line((-0.10000000000000142, 0), (0, 0.09999999999999964))
            Line((0, 0.09999999999999964), (4.971295102888185, 0.09999999999999964))
            Line((4.971295102888185, 0.09999999999999964), (4.971295102888185, 0))
        make_face()
    redondeo1_piece_10a = extrude(amount=85.93244382149273, mode=Mode.PRIVATE)
    redondeo1_piece_10a = split(redondeo1_piece_10a, bisect_by=Plane(origin=(-36.35861517531267, 13.041108912969635, -36.752103032136134), z_dir=(0, 0, -1)), keep=Keep.TOP, mode=Mode.PRIVATE)
    with BuildSketch(Plane(origin=(-37.50000000000001, 4.465000000000003, -36.752103032136134), x_dir=(1, 0, 0), z_dir=(0, 1, 0))) as redondeo1_piece_10b_section:
        with BuildLine():
            CenterArc((REDONDEO1_R, REDONDEO1_R), REDONDEO1_R, 180, 90)
            Line((0, REDONDEO1_R), (-REDONDEO1_R * 0.02, REDONDEO1_R))
            Line((-REDONDEO1_R * 0.02, REDONDEO1_R), (-REDONDEO1_R * 0.02, -REDONDEO1_R * 0.02))
            Line((-REDONDEO1_R * 0.02, -REDONDEO1_R * 0.02), (REDONDEO1_R, -REDONDEO1_R * 0.02))
            Line((REDONDEO1_R, -REDONDEO1_R * 0.02), (REDONDEO1_R, 0))
        make_face()
    redondeo1_piece_10b = extrude(amount=20, mode=Mode.PRIVATE)
    redondeo1_piece_10b = split(redondeo1_piece_10b, bisect_by=Plane(origin=(-36.36802442866587, 11.965, -37.88407860347027), z_dir=(0, 1, 0)), keep=Keep.TOP, mode=Mode.PRIVATE)
    redondeo1_piece_10b = split(redondeo1_piece_10b, bisect_by=Plane(origin=(-36.36802442866587, 16.43, -37.88407860347027), z_dir=(0, -1, 0)), keep=Keep.TOP, mode=Mode.PRIVATE)
    redondeo1_piece_10 = redondeo1_piece_10a & redondeo1_piece_10b
    add(redondeo1_piece_10)
    with BuildSketch(Plane(origin=(37.50000000000001, 4.465000000000003, 36.752103032136134), x_dir=(0, 0, 1), z_dir=(0, 1, 0))) as redondeo1_piece_11a_section:
        with BuildLine():
            CenterArc((REDONDEO1_R, -REDONDEO1_R), REDONDEO1_R, 90, 90)
            Line((0, -REDONDEO1_R), (-REDONDEO1_R * 0.02, -REDONDEO1_R))
            Line((-REDONDEO1_R * 0.02, -REDONDEO1_R), (-REDONDEO1_R * 0.02, REDONDEO1_R * 0.02))
            Line((-REDONDEO1_R * 0.02, REDONDEO1_R * 0.02), (REDONDEO1_R, REDONDEO1_R * 0.02))
            Line((REDONDEO1_R, REDONDEO1_R * 0.02), (REDONDEO1_R, 0))
        make_face()
    redondeo1_piece_11a = extrude(amount=20, mode=Mode.PRIVATE)
    redondeo1_piece_11a = split(redondeo1_piece_11a, bisect_by=Plane(origin=(36.36802442866585, 16.43, 37.88407860347026), z_dir=(0, -1, 0)), keep=Keep.TOP, mode=Mode.PRIVATE)
    redondeo1_piece_11a = split(redondeo1_piece_11a, bisect_by=Plane(origin=(36.36802442866584, 11.965, 37.88407860347026), z_dir=(0, 1, 0)), keep=Keep.TOP, mode=Mode.PRIVATE)
    with BuildSketch(Plane(origin=(37.50000000000002, 11.965, 49.18034078935661), x_dir=(-6.37e-15, 1, 0), z_dir=(0, 0, -1))) as redondeo1_piece_11b_section:
        with BuildLine():
            CenterArc((5.000000000000032, -4.971295102888174), REDONDEO1_R, 96.14240739102014, 83.85759260898021)
            Line((3.164e-14, -4.971295102888206), (-0.099999999999968, -4.971295102888207))
            Line((-0.099999999999968, -4.971295102888207), (-0.09999999999999964, -6.4e-16))
            Line((-0.09999999999999964, -6.4e-16), (-6.4e-16, 0.10000000000000142))
            ThreePointArc((-6.4e-16, 0.10000000000000142), (2.2324999999999995, 0.10000000000001563), (4.454299999999999, 0.09942590205776007))
            Line((4.454299999999999, 0.09942590205776007), (4.465, 0))
        make_face()
    redondeo1_piece_11b = extrude(amount=85.93244382149274, mode=Mode.PRIVATE)
    redondeo1_piece_11b = split(redondeo1_piece_11b, bisect_by=Plane(origin=(36.35861517531313, 13.041108912972746, 36.752103032136134), z_dir=(0, 0, 1)), keep=Keep.TOP, mode=Mode.PRIVATE)
    redondeo1_piece_11 = redondeo1_piece_11a & redondeo1_piece_11b
    add(redondeo1_piece_11)
    with BuildSketch(Plane(origin=(37.50000000000001, 11.965, 36.752103032136134), x_dir=(-3.18e-15, 1, 0), z_dir=(0, 0, -1))) as redondeo1_piece_12a_section:
        with BuildLine():
            CenterArc((5.000000000000016, -4.971295102888176), REDONDEO1_R, 96.14240739101996, 83.85759260898021)
            Line((1.582e-14, -4.971295102888192), (-0.09999999999998382, -4.971295102888192))
            Line((-0.09999999999998382, -4.971295102888192), (-0.09999999999999964, -3.2e-16))
            Line((-0.09999999999999964, -3.2e-16), (-3.2e-16, 0.10000000000000142))
            ThreePointArc((-3.2e-16, 0.10000000000000142), (2.2324999999999995, 0.10000000000002274), (4.4543, 0.09942590205776011))
            Line((4.4543, 0.09942590205776011), (4.465, 0))
        make_face()
    redondeo1_piece_12a = extrude(amount=85.93244382149273, mode=Mode.PRIVATE)
    redondeo1_piece_12a = split(redondeo1_piece_12a, bisect_by=Plane(origin=(36.35861517531357, 13.04110891297261, -36.752103032136134), z_dir=(0, 0, -1)), keep=Keep.TOP, mode=Mode.PRIVATE)
    with BuildSketch(Plane(origin=(37.50000000000001, 4.465000000000003, -36.752103032136134), x_dir=(0, 0, -1), z_dir=(0, 1, 0))) as redondeo1_piece_12b_section:
        with BuildLine():
            CenterArc((REDONDEO1_R, REDONDEO1_R), REDONDEO1_R, 180, 90)
            Line((0, REDONDEO1_R), (-REDONDEO1_R * 0.02, REDONDEO1_R))
            Line((-REDONDEO1_R * 0.02, REDONDEO1_R), (-REDONDEO1_R * 0.02, -REDONDEO1_R * 0.02))
            Line((-REDONDEO1_R * 0.02, -REDONDEO1_R * 0.02), (REDONDEO1_R, -REDONDEO1_R * 0.02))
            Line((REDONDEO1_R, -REDONDEO1_R * 0.02), (REDONDEO1_R, 0))
        make_face()
    redondeo1_piece_12b = extrude(amount=20, mode=Mode.PRIVATE)
    redondeo1_piece_12b = split(redondeo1_piece_12b, bisect_by=Plane(origin=(36.36802442866586, 16.43, -37.88407860347026), z_dir=(0, -1, 0)), keep=Keep.TOP, mode=Mode.PRIVATE)
    redondeo1_piece_12b = split(redondeo1_piece_12b, bisect_by=Plane(origin=(36.36802442866587, 11.965, -37.88407860347026), z_dir=(0, 1, 0)), keep=Keep.TOP, mode=Mode.PRIVATE)
    redondeo1_piece_12 = redondeo1_piece_12a & redondeo1_piece_12b
    add(redondeo1_piece_12)
    with BuildSketch(Plane(origin=(37.50000000000001, 4.465, -49.18034078935659), x_dir=(-1.59e-15, -1, 0), z_dir=(0, 0, 1))) as redondeo1_piece_13a_section:
        with BuildLine():
            CenterArc((5.000000000000008, -4.971295102888177), REDONDEO1_R, 96.14240739101987, 83.85759260898021)
            Line((7.91e-15, -4.971295102888185), (-0.09999999999999173, -4.971295102888185))
            Line((-0.09999999999999173, -4.971295102888185), (-0.09999999999999964, -1.6e-16))
            Line((-0.09999999999999964, -1.6e-16), (-1.6e-16, 0.10000000000000142))
            ThreePointArc((-1.6e-16, 0.10000000000000142), (2.2325, 0.09999999999999787), (4.4543, 0.09942590205776013))
            Line((4.4543, 0.09942590205776013), (4.465, 0))
        make_face()
    redondeo1_piece_13a = extrude(amount=85.93244382149271, mode=Mode.PRIVATE)
    redondeo1_piece_13a = split(redondeo1_piece_13a, bisect_by=Plane(origin=(36.35861517531293, 3.38889108702688, -36.752103032136134), z_dir=(0, 0, -1)), keep=Keep.TOP, mode=Mode.PRIVATE)
    with BuildSketch(Plane(origin=(37.499999999999986, -8.034999999999997, -36.752103032136134), x_dir=(0, 0, -1), z_dir=(0, 1, 0))) as redondeo1_piece_13b_section:
        with BuildLine():
            CenterArc((REDONDEO1_R, REDONDEO1_R), REDONDEO1_R, 180.00000000000009, 89.99999999999989)
            Line((0, REDONDEO1_R), (-REDONDEO1_R * 0.02, REDONDEO1_R))
            Line((-REDONDEO1_R * 0.02, REDONDEO1_R), (-REDONDEO1_R * 0.02, -REDONDEO1_R * 0.02))
            Line((-REDONDEO1_R * 0.02, -REDONDEO1_R * 0.02), (REDONDEO1_R, -REDONDEO1_R * 0.02))
            Line((REDONDEO1_R, -REDONDEO1_R * 0.02), (REDONDEO1_R, 0))
        make_face()
    redondeo1_piece_13b = extrude(amount=20, mode=Mode.PRIVATE)
    redondeo1_piece_13b = split(redondeo1_piece_13b, bisect_by=Plane(origin=(36.368024428665855, 0, -37.88407860347026), z_dir=(0, 1, 0)), keep=Keep.TOP, mode=Mode.PRIVATE)
    redondeo1_piece_13b = split(redondeo1_piece_13b, bisect_by=Plane(origin=(36.368024428665855, 4.465, -37.88407860347026), z_dir=(0, -1, 0)), keep=Keep.TOP, mode=Mode.PRIVATE)
    redondeo1_piece_13 = redondeo1_piece_13a & redondeo1_piece_13b
    add(redondeo1_piece_13)
    with BuildSketch(Plane(origin=(37.50000000000001, 4.465, -36.752103032136134), x_dir=(-1.59e-15, -1, 0), z_dir=(0, 0, 1))) as redondeo1_piece_14a_section:
        with BuildLine():
            CenterArc((5.000000000000008, -4.971295102888177), REDONDEO1_R, 96.14240739101987, 83.85759260898021)
            Line((7.91e-15, -4.971295102888185), (-0.09999999999999173, -4.971295102888185))
            Line((-0.09999999999999173, -4.971295102888185), (-0.09999999999999964, -1.6e-16))
            Line((-0.09999999999999964, -1.6e-16), (-1.6e-16, 0.10000000000000142))
            ThreePointArc((-1.6e-16, 0.10000000000000142), (2.2325, 0.09999999999999787), (4.4543, 0.09942590205776013))
            Line((4.4543, 0.09942590205776013), (4.465, 0))
        make_face()
    redondeo1_piece_14a = extrude(amount=85.93244382149273, mode=Mode.PRIVATE)
    redondeo1_piece_14a = split(redondeo1_piece_14a, bisect_by=Plane(origin=(36.35861517531297, 3.3888910870269298, 36.752103032136134), z_dir=(0, 0, 1)), keep=Keep.TOP, mode=Mode.PRIVATE)
    with BuildSketch(Plane(origin=(37.499999999999986, -8.034999999999997, 36.752103032136134), x_dir=(0, 0, 1), z_dir=(0, 1, 0))) as redondeo1_piece_14b_section:
        with BuildLine():
            CenterArc((REDONDEO1_R, -REDONDEO1_R), REDONDEO1_R, 90, 90)
            Line((0, -REDONDEO1_R), (-REDONDEO1_R * 0.02, -REDONDEO1_R))
            Line((-REDONDEO1_R * 0.02, -REDONDEO1_R), (-REDONDEO1_R * 0.02, REDONDEO1_R * 0.02))
            Line((-REDONDEO1_R * 0.02, REDONDEO1_R * 0.02), (REDONDEO1_R, REDONDEO1_R * 0.02))
            Line((REDONDEO1_R, REDONDEO1_R * 0.02), (REDONDEO1_R, 0))
        make_face()
    redondeo1_piece_14b = extrude(amount=20, mode=Mode.PRIVATE)
    redondeo1_piece_14b = split(redondeo1_piece_14b, bisect_by=Plane(origin=(36.36802442866586, 0, 37.88407860347026), z_dir=(0, 1, 0)), keep=Keep.TOP, mode=Mode.PRIVATE)
    redondeo1_piece_14b = split(redondeo1_piece_14b, bisect_by=Plane(origin=(36.36802442866586, 4.465, 37.88407860347026), z_dir=(0, -1, 0)), keep=Keep.TOP, mode=Mode.PRIVATE)
    redondeo1_piece_14 = redondeo1_piece_14a & redondeo1_piece_14b
    add(redondeo1_piece_14)

    # Croquis7 → Cortar-Extruir4 (cut, two sides: drawn at the far end of the back side and taken through both)
    with BuildSketch(Plane.XY.offset(-CORTAR_EXTRUIR4_DEPTH_BACK)):
        Polygon((-54.99999999999999, 12.214999999999998), (-46.99999999999999, 12.215000000000003), (-46.99999999999999, 4.215000000000002), (-54.99999999999999, 4.215000000000002), align=None)
        Polygon((46.99999999999999, 12.215000000000003), (46.99999999999999, 4.215000000000002), (54.99999999999999, 4.215000000000002), (54.99999999999999, 12.214999999999998), align=None)
    extrude(amount=CORTAR_EXTRUIR4_DEPTH + CORTAR_EXTRUIR4_DEPTH_BACK, mode=Mode.SUBTRACT)

    # Croquis8 → Cortar-Extruir5 (cut, two sides: drawn at the far end of the back side and taken through both)
    with BuildSketch(Plane(origin=(0, 4.215000000000002, 0), x_dir=(1, 0, 0), z_dir=(0, 1, 0)).offset(-CORTAR_EXTRUIR5_DEPTH_BACK)):
        with Locations(Location((-50.99999999999999, 35.99019513592787, 0), (0, 0, 270))):
            Circle(CROQUIS8_R)
        with Locations(Location((-50.99999999999999, -35.99019513592787, 0), (0, 0, 270))):
            Circle(CROQUIS8_R)
        with Locations((50.99999999999999, -35.99019513592787)):
            Circle(CROQUIS8_R)
        with Locations((50.99999999999999, 35.99019513592787)):
            Circle(CROQUIS8_R)
    extrude(amount=CORTAR_EXTRUIR5_DEPTH + CORTAR_EXTRUIR5_DEPTH_BACK, mode=Mode.SUBTRACT)


solid = part.part
